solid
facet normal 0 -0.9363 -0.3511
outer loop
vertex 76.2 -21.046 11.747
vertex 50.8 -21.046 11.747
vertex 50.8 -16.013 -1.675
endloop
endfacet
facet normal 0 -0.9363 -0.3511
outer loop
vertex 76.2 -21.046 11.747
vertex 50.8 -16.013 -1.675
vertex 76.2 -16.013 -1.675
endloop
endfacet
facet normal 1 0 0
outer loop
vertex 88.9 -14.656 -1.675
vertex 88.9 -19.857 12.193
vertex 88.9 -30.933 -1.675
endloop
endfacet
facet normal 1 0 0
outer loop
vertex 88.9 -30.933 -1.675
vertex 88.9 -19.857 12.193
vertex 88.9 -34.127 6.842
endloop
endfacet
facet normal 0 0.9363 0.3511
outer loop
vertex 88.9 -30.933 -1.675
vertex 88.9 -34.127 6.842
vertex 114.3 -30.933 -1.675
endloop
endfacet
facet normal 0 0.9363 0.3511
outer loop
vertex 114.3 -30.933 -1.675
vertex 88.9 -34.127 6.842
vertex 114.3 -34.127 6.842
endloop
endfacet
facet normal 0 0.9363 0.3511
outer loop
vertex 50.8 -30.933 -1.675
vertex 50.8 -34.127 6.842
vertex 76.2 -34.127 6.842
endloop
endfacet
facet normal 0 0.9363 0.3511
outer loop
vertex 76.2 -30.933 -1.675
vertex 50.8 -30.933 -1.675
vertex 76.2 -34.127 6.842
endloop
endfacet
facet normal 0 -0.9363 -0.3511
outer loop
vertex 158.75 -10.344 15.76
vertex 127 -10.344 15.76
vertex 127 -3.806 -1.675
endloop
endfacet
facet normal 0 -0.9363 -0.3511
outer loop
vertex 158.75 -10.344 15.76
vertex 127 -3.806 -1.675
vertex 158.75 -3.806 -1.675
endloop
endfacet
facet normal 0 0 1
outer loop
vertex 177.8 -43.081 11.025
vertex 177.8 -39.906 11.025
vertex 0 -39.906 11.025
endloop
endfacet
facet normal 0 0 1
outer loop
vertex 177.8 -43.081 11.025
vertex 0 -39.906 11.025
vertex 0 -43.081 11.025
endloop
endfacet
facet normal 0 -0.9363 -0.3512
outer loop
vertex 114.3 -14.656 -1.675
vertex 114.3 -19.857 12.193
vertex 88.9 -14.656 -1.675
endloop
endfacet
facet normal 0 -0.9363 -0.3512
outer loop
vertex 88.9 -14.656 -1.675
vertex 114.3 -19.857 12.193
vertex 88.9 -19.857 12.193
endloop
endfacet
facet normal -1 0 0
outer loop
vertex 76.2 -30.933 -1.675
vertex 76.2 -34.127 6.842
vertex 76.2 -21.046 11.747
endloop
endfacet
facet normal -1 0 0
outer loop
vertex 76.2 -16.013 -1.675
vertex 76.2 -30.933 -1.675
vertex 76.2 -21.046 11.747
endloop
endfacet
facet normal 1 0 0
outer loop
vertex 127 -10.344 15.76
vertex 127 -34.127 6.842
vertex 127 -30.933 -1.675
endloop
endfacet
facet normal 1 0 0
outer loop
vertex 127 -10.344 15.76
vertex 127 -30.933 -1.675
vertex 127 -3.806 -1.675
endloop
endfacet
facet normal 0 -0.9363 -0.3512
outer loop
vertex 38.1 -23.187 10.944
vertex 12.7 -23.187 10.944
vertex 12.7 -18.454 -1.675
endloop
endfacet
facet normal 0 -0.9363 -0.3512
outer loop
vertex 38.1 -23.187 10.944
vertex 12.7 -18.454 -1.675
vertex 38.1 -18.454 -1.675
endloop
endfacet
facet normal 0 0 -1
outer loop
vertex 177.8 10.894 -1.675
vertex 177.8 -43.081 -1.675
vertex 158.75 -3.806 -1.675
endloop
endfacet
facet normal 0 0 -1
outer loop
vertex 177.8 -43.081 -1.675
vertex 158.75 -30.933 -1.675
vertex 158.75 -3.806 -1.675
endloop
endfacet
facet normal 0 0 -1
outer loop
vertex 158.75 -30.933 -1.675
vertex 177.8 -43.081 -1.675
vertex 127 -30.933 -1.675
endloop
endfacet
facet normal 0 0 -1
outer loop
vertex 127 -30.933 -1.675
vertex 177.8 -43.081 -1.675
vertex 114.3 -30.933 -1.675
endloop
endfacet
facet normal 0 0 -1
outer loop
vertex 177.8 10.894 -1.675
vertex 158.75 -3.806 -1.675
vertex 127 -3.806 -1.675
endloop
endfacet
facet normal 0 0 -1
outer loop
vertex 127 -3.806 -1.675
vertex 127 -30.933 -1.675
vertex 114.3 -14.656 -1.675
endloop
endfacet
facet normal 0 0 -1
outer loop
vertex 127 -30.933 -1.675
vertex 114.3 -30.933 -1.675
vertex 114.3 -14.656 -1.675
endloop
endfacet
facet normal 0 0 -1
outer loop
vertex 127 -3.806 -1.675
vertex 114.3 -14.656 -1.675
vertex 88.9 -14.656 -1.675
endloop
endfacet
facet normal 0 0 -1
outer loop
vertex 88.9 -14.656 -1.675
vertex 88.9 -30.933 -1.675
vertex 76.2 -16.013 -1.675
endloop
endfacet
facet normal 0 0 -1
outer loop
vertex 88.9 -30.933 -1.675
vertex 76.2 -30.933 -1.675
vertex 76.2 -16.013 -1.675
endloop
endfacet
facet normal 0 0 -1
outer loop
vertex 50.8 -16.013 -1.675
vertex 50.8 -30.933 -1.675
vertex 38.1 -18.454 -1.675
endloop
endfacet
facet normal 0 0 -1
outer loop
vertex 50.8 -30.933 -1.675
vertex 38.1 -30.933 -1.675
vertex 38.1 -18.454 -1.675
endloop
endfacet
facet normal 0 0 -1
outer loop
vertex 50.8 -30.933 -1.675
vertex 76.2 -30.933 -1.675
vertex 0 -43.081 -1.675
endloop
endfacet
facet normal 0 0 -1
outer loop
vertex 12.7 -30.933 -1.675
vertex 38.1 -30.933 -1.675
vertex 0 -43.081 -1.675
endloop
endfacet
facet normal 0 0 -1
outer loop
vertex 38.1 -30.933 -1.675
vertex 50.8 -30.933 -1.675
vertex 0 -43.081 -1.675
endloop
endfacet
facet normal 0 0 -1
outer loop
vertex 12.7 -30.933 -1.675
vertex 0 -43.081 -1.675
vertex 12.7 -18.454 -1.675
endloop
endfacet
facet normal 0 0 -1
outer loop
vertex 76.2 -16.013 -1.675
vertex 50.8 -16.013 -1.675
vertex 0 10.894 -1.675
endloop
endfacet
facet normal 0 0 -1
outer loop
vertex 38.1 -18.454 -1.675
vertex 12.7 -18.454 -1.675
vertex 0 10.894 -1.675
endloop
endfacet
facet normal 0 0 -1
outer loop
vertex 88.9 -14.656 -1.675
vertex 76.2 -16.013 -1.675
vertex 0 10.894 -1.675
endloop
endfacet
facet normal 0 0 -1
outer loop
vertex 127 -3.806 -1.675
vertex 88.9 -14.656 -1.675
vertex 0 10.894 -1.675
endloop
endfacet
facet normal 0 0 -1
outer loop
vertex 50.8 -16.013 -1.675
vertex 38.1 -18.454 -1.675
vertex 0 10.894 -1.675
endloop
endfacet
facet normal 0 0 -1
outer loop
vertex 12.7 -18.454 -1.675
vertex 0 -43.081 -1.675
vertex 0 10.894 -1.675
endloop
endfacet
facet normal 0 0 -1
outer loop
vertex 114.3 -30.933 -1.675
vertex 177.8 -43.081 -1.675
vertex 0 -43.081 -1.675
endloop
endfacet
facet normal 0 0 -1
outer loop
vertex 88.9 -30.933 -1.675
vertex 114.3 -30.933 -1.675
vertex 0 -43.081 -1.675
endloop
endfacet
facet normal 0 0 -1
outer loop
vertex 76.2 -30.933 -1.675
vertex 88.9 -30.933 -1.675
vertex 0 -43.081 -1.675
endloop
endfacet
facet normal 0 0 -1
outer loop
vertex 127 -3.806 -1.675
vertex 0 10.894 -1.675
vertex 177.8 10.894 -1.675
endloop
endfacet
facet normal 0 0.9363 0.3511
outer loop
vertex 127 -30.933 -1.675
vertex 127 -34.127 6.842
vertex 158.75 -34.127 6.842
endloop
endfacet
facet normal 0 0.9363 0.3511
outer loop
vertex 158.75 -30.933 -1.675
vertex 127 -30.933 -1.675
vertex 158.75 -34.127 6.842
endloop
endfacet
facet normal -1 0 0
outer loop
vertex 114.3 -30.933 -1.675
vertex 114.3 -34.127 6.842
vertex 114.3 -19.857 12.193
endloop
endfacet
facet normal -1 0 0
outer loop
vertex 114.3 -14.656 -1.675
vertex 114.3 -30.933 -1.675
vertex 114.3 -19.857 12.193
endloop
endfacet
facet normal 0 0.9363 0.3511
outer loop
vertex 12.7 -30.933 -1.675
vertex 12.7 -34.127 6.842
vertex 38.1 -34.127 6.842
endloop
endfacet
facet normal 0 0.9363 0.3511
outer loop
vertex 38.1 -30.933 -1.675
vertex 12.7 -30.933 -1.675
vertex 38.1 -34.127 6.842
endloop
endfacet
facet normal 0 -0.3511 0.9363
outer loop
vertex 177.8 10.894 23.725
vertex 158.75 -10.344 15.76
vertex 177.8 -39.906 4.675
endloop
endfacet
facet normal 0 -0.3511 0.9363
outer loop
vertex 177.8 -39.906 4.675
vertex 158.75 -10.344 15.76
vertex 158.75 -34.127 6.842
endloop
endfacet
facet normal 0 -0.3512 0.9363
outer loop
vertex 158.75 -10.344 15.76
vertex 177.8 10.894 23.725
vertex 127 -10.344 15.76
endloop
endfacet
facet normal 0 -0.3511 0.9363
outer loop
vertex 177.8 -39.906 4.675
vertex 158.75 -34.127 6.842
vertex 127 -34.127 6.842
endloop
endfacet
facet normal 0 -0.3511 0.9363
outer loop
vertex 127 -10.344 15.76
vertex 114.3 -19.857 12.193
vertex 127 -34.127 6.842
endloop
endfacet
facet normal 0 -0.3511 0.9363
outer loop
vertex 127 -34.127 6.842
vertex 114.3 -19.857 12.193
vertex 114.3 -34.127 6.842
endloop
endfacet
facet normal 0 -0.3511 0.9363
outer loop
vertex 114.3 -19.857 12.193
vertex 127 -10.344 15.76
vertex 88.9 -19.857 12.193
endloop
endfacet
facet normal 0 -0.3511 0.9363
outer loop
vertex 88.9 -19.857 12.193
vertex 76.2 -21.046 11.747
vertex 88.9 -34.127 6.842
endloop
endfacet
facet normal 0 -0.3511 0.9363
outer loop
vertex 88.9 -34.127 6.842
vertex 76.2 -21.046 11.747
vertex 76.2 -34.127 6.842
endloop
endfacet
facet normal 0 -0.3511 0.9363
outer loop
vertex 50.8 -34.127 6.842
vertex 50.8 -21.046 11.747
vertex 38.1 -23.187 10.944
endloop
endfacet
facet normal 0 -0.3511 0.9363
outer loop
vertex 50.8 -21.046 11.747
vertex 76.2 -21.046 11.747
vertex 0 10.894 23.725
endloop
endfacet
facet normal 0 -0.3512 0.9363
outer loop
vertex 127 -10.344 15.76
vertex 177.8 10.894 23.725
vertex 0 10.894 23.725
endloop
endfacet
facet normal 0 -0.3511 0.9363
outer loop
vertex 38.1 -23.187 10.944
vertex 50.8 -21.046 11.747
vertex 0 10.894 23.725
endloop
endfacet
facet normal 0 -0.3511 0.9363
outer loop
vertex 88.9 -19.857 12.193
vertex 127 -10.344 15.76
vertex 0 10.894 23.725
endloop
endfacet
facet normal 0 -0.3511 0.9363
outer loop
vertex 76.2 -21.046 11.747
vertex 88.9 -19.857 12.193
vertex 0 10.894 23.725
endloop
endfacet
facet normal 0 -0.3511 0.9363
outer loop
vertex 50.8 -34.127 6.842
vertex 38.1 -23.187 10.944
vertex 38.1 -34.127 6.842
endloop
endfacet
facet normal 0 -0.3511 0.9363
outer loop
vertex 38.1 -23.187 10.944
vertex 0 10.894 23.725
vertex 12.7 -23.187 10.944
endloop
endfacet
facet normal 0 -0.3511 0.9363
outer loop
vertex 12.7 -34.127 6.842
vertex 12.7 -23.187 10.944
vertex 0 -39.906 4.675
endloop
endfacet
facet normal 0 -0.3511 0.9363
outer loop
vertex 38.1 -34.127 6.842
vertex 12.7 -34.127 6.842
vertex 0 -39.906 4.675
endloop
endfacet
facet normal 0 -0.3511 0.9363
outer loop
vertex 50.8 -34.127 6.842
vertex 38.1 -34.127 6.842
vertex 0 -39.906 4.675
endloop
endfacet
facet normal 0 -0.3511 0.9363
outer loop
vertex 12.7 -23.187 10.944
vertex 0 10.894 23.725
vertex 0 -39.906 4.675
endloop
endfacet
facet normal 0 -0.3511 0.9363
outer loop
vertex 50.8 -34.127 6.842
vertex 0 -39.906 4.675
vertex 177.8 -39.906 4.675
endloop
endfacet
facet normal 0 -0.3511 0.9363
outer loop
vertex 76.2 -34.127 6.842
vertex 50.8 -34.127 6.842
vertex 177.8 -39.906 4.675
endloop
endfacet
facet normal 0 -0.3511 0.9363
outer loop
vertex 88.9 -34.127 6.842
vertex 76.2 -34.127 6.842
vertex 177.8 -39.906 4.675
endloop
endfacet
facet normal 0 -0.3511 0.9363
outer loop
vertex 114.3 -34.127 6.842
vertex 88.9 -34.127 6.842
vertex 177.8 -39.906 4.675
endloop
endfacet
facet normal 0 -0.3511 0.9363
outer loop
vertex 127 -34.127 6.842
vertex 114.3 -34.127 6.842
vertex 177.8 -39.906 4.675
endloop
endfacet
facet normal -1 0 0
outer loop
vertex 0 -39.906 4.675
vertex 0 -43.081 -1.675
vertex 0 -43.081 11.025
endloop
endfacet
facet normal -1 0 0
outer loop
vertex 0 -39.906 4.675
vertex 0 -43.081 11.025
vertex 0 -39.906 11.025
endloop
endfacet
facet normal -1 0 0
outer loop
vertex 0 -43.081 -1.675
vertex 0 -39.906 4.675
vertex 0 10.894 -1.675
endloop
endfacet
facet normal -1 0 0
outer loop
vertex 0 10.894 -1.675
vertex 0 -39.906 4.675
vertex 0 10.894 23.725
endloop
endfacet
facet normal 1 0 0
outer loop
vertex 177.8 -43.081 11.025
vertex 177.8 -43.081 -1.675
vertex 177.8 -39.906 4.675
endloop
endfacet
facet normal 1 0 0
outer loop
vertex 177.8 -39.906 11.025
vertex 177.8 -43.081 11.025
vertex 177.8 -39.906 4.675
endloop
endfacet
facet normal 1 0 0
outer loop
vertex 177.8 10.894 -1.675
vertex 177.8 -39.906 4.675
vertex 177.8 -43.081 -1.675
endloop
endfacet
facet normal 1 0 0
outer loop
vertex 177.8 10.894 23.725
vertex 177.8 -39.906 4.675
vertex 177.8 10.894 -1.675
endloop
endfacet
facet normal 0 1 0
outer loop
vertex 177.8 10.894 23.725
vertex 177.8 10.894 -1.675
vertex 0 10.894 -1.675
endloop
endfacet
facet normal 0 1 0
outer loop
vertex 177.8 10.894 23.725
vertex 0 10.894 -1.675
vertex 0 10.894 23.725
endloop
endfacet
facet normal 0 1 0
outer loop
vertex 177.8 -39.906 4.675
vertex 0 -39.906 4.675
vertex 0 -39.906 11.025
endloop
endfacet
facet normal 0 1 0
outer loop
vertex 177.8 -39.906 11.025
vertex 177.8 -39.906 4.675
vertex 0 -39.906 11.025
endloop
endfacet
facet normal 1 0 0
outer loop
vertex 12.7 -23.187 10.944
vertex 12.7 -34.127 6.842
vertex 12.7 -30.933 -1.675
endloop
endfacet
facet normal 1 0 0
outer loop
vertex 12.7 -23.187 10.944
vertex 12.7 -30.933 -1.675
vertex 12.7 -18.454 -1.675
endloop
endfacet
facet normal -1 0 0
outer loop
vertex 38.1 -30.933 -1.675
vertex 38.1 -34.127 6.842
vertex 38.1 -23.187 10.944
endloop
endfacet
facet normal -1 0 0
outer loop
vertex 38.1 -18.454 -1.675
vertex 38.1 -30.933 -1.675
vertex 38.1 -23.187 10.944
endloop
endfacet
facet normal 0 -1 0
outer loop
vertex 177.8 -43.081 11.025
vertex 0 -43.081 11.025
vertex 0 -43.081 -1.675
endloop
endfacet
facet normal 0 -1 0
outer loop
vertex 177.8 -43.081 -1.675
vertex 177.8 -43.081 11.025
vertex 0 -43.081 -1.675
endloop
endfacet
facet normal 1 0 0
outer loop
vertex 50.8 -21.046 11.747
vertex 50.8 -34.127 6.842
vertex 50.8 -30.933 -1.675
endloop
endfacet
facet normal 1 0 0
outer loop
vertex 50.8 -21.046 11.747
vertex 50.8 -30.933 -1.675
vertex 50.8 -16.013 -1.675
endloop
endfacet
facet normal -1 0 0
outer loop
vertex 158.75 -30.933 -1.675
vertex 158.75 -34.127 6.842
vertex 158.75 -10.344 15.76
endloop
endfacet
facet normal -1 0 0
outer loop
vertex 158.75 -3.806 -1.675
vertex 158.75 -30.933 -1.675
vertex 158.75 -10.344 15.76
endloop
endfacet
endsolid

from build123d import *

# Parameters (mm, degrees)
F0_W     = 50.8
F0_H     = 6.35
F1_DEPTH = 177.8
F2_W     = 25.4
F2_H     = 13.97
F2_H_2   = 11.684
F2_W_2   = 31.75
F2_H_3   = 25.4
F3_DEPTH = 25.4


with BuildPart() as f1:
    # F0 (on Right) → F1 (new body)
    with BuildSketch(Plane.YZ):
        with Locations((-14.505542, 1.499517)):
            Rectangle(F0_W, F0_H)
        Polygon((10.894458, 23.724517), (-39.905542, 4.674517), (10.894458, 4.674517), align=None)
        Polygon((-39.905542, -1.675483), (-39.905542, 4.674517), (-39.905542, 11.024517), (-43.080542, 11.024517), (-43.080542, -1.675483), align=None)
    extrude(amount=F1_DEPTH)

    # F2 (on face) → F3 (cut)
    with BuildSketch(Plane(origin=(0, -6.456689, 17.217837), x_dir=(1, 0, 0), z_dir=(0, -0.351123, 0.936329))):
        Polygon((101.6, -29.551553), (114.3, -29.551553), (114.3, -14.311553), (88.9, -14.311553), (88.9, -29.551553), align=None)
        with Locations((63.5, -22.566553)):
            Rectangle(F2_W, F2_H)
        with Locations((25.4, -23.709553)):
            Rectangle(F2_W, F2_H_2)
        with Locations((142.875, -16.851553)):
            Rectangle(F2_W_2, F2_H_3)
    extrude(amount=-F3_DEPTH, mode=Mode.SUBTRACT)


solid = f1.part
